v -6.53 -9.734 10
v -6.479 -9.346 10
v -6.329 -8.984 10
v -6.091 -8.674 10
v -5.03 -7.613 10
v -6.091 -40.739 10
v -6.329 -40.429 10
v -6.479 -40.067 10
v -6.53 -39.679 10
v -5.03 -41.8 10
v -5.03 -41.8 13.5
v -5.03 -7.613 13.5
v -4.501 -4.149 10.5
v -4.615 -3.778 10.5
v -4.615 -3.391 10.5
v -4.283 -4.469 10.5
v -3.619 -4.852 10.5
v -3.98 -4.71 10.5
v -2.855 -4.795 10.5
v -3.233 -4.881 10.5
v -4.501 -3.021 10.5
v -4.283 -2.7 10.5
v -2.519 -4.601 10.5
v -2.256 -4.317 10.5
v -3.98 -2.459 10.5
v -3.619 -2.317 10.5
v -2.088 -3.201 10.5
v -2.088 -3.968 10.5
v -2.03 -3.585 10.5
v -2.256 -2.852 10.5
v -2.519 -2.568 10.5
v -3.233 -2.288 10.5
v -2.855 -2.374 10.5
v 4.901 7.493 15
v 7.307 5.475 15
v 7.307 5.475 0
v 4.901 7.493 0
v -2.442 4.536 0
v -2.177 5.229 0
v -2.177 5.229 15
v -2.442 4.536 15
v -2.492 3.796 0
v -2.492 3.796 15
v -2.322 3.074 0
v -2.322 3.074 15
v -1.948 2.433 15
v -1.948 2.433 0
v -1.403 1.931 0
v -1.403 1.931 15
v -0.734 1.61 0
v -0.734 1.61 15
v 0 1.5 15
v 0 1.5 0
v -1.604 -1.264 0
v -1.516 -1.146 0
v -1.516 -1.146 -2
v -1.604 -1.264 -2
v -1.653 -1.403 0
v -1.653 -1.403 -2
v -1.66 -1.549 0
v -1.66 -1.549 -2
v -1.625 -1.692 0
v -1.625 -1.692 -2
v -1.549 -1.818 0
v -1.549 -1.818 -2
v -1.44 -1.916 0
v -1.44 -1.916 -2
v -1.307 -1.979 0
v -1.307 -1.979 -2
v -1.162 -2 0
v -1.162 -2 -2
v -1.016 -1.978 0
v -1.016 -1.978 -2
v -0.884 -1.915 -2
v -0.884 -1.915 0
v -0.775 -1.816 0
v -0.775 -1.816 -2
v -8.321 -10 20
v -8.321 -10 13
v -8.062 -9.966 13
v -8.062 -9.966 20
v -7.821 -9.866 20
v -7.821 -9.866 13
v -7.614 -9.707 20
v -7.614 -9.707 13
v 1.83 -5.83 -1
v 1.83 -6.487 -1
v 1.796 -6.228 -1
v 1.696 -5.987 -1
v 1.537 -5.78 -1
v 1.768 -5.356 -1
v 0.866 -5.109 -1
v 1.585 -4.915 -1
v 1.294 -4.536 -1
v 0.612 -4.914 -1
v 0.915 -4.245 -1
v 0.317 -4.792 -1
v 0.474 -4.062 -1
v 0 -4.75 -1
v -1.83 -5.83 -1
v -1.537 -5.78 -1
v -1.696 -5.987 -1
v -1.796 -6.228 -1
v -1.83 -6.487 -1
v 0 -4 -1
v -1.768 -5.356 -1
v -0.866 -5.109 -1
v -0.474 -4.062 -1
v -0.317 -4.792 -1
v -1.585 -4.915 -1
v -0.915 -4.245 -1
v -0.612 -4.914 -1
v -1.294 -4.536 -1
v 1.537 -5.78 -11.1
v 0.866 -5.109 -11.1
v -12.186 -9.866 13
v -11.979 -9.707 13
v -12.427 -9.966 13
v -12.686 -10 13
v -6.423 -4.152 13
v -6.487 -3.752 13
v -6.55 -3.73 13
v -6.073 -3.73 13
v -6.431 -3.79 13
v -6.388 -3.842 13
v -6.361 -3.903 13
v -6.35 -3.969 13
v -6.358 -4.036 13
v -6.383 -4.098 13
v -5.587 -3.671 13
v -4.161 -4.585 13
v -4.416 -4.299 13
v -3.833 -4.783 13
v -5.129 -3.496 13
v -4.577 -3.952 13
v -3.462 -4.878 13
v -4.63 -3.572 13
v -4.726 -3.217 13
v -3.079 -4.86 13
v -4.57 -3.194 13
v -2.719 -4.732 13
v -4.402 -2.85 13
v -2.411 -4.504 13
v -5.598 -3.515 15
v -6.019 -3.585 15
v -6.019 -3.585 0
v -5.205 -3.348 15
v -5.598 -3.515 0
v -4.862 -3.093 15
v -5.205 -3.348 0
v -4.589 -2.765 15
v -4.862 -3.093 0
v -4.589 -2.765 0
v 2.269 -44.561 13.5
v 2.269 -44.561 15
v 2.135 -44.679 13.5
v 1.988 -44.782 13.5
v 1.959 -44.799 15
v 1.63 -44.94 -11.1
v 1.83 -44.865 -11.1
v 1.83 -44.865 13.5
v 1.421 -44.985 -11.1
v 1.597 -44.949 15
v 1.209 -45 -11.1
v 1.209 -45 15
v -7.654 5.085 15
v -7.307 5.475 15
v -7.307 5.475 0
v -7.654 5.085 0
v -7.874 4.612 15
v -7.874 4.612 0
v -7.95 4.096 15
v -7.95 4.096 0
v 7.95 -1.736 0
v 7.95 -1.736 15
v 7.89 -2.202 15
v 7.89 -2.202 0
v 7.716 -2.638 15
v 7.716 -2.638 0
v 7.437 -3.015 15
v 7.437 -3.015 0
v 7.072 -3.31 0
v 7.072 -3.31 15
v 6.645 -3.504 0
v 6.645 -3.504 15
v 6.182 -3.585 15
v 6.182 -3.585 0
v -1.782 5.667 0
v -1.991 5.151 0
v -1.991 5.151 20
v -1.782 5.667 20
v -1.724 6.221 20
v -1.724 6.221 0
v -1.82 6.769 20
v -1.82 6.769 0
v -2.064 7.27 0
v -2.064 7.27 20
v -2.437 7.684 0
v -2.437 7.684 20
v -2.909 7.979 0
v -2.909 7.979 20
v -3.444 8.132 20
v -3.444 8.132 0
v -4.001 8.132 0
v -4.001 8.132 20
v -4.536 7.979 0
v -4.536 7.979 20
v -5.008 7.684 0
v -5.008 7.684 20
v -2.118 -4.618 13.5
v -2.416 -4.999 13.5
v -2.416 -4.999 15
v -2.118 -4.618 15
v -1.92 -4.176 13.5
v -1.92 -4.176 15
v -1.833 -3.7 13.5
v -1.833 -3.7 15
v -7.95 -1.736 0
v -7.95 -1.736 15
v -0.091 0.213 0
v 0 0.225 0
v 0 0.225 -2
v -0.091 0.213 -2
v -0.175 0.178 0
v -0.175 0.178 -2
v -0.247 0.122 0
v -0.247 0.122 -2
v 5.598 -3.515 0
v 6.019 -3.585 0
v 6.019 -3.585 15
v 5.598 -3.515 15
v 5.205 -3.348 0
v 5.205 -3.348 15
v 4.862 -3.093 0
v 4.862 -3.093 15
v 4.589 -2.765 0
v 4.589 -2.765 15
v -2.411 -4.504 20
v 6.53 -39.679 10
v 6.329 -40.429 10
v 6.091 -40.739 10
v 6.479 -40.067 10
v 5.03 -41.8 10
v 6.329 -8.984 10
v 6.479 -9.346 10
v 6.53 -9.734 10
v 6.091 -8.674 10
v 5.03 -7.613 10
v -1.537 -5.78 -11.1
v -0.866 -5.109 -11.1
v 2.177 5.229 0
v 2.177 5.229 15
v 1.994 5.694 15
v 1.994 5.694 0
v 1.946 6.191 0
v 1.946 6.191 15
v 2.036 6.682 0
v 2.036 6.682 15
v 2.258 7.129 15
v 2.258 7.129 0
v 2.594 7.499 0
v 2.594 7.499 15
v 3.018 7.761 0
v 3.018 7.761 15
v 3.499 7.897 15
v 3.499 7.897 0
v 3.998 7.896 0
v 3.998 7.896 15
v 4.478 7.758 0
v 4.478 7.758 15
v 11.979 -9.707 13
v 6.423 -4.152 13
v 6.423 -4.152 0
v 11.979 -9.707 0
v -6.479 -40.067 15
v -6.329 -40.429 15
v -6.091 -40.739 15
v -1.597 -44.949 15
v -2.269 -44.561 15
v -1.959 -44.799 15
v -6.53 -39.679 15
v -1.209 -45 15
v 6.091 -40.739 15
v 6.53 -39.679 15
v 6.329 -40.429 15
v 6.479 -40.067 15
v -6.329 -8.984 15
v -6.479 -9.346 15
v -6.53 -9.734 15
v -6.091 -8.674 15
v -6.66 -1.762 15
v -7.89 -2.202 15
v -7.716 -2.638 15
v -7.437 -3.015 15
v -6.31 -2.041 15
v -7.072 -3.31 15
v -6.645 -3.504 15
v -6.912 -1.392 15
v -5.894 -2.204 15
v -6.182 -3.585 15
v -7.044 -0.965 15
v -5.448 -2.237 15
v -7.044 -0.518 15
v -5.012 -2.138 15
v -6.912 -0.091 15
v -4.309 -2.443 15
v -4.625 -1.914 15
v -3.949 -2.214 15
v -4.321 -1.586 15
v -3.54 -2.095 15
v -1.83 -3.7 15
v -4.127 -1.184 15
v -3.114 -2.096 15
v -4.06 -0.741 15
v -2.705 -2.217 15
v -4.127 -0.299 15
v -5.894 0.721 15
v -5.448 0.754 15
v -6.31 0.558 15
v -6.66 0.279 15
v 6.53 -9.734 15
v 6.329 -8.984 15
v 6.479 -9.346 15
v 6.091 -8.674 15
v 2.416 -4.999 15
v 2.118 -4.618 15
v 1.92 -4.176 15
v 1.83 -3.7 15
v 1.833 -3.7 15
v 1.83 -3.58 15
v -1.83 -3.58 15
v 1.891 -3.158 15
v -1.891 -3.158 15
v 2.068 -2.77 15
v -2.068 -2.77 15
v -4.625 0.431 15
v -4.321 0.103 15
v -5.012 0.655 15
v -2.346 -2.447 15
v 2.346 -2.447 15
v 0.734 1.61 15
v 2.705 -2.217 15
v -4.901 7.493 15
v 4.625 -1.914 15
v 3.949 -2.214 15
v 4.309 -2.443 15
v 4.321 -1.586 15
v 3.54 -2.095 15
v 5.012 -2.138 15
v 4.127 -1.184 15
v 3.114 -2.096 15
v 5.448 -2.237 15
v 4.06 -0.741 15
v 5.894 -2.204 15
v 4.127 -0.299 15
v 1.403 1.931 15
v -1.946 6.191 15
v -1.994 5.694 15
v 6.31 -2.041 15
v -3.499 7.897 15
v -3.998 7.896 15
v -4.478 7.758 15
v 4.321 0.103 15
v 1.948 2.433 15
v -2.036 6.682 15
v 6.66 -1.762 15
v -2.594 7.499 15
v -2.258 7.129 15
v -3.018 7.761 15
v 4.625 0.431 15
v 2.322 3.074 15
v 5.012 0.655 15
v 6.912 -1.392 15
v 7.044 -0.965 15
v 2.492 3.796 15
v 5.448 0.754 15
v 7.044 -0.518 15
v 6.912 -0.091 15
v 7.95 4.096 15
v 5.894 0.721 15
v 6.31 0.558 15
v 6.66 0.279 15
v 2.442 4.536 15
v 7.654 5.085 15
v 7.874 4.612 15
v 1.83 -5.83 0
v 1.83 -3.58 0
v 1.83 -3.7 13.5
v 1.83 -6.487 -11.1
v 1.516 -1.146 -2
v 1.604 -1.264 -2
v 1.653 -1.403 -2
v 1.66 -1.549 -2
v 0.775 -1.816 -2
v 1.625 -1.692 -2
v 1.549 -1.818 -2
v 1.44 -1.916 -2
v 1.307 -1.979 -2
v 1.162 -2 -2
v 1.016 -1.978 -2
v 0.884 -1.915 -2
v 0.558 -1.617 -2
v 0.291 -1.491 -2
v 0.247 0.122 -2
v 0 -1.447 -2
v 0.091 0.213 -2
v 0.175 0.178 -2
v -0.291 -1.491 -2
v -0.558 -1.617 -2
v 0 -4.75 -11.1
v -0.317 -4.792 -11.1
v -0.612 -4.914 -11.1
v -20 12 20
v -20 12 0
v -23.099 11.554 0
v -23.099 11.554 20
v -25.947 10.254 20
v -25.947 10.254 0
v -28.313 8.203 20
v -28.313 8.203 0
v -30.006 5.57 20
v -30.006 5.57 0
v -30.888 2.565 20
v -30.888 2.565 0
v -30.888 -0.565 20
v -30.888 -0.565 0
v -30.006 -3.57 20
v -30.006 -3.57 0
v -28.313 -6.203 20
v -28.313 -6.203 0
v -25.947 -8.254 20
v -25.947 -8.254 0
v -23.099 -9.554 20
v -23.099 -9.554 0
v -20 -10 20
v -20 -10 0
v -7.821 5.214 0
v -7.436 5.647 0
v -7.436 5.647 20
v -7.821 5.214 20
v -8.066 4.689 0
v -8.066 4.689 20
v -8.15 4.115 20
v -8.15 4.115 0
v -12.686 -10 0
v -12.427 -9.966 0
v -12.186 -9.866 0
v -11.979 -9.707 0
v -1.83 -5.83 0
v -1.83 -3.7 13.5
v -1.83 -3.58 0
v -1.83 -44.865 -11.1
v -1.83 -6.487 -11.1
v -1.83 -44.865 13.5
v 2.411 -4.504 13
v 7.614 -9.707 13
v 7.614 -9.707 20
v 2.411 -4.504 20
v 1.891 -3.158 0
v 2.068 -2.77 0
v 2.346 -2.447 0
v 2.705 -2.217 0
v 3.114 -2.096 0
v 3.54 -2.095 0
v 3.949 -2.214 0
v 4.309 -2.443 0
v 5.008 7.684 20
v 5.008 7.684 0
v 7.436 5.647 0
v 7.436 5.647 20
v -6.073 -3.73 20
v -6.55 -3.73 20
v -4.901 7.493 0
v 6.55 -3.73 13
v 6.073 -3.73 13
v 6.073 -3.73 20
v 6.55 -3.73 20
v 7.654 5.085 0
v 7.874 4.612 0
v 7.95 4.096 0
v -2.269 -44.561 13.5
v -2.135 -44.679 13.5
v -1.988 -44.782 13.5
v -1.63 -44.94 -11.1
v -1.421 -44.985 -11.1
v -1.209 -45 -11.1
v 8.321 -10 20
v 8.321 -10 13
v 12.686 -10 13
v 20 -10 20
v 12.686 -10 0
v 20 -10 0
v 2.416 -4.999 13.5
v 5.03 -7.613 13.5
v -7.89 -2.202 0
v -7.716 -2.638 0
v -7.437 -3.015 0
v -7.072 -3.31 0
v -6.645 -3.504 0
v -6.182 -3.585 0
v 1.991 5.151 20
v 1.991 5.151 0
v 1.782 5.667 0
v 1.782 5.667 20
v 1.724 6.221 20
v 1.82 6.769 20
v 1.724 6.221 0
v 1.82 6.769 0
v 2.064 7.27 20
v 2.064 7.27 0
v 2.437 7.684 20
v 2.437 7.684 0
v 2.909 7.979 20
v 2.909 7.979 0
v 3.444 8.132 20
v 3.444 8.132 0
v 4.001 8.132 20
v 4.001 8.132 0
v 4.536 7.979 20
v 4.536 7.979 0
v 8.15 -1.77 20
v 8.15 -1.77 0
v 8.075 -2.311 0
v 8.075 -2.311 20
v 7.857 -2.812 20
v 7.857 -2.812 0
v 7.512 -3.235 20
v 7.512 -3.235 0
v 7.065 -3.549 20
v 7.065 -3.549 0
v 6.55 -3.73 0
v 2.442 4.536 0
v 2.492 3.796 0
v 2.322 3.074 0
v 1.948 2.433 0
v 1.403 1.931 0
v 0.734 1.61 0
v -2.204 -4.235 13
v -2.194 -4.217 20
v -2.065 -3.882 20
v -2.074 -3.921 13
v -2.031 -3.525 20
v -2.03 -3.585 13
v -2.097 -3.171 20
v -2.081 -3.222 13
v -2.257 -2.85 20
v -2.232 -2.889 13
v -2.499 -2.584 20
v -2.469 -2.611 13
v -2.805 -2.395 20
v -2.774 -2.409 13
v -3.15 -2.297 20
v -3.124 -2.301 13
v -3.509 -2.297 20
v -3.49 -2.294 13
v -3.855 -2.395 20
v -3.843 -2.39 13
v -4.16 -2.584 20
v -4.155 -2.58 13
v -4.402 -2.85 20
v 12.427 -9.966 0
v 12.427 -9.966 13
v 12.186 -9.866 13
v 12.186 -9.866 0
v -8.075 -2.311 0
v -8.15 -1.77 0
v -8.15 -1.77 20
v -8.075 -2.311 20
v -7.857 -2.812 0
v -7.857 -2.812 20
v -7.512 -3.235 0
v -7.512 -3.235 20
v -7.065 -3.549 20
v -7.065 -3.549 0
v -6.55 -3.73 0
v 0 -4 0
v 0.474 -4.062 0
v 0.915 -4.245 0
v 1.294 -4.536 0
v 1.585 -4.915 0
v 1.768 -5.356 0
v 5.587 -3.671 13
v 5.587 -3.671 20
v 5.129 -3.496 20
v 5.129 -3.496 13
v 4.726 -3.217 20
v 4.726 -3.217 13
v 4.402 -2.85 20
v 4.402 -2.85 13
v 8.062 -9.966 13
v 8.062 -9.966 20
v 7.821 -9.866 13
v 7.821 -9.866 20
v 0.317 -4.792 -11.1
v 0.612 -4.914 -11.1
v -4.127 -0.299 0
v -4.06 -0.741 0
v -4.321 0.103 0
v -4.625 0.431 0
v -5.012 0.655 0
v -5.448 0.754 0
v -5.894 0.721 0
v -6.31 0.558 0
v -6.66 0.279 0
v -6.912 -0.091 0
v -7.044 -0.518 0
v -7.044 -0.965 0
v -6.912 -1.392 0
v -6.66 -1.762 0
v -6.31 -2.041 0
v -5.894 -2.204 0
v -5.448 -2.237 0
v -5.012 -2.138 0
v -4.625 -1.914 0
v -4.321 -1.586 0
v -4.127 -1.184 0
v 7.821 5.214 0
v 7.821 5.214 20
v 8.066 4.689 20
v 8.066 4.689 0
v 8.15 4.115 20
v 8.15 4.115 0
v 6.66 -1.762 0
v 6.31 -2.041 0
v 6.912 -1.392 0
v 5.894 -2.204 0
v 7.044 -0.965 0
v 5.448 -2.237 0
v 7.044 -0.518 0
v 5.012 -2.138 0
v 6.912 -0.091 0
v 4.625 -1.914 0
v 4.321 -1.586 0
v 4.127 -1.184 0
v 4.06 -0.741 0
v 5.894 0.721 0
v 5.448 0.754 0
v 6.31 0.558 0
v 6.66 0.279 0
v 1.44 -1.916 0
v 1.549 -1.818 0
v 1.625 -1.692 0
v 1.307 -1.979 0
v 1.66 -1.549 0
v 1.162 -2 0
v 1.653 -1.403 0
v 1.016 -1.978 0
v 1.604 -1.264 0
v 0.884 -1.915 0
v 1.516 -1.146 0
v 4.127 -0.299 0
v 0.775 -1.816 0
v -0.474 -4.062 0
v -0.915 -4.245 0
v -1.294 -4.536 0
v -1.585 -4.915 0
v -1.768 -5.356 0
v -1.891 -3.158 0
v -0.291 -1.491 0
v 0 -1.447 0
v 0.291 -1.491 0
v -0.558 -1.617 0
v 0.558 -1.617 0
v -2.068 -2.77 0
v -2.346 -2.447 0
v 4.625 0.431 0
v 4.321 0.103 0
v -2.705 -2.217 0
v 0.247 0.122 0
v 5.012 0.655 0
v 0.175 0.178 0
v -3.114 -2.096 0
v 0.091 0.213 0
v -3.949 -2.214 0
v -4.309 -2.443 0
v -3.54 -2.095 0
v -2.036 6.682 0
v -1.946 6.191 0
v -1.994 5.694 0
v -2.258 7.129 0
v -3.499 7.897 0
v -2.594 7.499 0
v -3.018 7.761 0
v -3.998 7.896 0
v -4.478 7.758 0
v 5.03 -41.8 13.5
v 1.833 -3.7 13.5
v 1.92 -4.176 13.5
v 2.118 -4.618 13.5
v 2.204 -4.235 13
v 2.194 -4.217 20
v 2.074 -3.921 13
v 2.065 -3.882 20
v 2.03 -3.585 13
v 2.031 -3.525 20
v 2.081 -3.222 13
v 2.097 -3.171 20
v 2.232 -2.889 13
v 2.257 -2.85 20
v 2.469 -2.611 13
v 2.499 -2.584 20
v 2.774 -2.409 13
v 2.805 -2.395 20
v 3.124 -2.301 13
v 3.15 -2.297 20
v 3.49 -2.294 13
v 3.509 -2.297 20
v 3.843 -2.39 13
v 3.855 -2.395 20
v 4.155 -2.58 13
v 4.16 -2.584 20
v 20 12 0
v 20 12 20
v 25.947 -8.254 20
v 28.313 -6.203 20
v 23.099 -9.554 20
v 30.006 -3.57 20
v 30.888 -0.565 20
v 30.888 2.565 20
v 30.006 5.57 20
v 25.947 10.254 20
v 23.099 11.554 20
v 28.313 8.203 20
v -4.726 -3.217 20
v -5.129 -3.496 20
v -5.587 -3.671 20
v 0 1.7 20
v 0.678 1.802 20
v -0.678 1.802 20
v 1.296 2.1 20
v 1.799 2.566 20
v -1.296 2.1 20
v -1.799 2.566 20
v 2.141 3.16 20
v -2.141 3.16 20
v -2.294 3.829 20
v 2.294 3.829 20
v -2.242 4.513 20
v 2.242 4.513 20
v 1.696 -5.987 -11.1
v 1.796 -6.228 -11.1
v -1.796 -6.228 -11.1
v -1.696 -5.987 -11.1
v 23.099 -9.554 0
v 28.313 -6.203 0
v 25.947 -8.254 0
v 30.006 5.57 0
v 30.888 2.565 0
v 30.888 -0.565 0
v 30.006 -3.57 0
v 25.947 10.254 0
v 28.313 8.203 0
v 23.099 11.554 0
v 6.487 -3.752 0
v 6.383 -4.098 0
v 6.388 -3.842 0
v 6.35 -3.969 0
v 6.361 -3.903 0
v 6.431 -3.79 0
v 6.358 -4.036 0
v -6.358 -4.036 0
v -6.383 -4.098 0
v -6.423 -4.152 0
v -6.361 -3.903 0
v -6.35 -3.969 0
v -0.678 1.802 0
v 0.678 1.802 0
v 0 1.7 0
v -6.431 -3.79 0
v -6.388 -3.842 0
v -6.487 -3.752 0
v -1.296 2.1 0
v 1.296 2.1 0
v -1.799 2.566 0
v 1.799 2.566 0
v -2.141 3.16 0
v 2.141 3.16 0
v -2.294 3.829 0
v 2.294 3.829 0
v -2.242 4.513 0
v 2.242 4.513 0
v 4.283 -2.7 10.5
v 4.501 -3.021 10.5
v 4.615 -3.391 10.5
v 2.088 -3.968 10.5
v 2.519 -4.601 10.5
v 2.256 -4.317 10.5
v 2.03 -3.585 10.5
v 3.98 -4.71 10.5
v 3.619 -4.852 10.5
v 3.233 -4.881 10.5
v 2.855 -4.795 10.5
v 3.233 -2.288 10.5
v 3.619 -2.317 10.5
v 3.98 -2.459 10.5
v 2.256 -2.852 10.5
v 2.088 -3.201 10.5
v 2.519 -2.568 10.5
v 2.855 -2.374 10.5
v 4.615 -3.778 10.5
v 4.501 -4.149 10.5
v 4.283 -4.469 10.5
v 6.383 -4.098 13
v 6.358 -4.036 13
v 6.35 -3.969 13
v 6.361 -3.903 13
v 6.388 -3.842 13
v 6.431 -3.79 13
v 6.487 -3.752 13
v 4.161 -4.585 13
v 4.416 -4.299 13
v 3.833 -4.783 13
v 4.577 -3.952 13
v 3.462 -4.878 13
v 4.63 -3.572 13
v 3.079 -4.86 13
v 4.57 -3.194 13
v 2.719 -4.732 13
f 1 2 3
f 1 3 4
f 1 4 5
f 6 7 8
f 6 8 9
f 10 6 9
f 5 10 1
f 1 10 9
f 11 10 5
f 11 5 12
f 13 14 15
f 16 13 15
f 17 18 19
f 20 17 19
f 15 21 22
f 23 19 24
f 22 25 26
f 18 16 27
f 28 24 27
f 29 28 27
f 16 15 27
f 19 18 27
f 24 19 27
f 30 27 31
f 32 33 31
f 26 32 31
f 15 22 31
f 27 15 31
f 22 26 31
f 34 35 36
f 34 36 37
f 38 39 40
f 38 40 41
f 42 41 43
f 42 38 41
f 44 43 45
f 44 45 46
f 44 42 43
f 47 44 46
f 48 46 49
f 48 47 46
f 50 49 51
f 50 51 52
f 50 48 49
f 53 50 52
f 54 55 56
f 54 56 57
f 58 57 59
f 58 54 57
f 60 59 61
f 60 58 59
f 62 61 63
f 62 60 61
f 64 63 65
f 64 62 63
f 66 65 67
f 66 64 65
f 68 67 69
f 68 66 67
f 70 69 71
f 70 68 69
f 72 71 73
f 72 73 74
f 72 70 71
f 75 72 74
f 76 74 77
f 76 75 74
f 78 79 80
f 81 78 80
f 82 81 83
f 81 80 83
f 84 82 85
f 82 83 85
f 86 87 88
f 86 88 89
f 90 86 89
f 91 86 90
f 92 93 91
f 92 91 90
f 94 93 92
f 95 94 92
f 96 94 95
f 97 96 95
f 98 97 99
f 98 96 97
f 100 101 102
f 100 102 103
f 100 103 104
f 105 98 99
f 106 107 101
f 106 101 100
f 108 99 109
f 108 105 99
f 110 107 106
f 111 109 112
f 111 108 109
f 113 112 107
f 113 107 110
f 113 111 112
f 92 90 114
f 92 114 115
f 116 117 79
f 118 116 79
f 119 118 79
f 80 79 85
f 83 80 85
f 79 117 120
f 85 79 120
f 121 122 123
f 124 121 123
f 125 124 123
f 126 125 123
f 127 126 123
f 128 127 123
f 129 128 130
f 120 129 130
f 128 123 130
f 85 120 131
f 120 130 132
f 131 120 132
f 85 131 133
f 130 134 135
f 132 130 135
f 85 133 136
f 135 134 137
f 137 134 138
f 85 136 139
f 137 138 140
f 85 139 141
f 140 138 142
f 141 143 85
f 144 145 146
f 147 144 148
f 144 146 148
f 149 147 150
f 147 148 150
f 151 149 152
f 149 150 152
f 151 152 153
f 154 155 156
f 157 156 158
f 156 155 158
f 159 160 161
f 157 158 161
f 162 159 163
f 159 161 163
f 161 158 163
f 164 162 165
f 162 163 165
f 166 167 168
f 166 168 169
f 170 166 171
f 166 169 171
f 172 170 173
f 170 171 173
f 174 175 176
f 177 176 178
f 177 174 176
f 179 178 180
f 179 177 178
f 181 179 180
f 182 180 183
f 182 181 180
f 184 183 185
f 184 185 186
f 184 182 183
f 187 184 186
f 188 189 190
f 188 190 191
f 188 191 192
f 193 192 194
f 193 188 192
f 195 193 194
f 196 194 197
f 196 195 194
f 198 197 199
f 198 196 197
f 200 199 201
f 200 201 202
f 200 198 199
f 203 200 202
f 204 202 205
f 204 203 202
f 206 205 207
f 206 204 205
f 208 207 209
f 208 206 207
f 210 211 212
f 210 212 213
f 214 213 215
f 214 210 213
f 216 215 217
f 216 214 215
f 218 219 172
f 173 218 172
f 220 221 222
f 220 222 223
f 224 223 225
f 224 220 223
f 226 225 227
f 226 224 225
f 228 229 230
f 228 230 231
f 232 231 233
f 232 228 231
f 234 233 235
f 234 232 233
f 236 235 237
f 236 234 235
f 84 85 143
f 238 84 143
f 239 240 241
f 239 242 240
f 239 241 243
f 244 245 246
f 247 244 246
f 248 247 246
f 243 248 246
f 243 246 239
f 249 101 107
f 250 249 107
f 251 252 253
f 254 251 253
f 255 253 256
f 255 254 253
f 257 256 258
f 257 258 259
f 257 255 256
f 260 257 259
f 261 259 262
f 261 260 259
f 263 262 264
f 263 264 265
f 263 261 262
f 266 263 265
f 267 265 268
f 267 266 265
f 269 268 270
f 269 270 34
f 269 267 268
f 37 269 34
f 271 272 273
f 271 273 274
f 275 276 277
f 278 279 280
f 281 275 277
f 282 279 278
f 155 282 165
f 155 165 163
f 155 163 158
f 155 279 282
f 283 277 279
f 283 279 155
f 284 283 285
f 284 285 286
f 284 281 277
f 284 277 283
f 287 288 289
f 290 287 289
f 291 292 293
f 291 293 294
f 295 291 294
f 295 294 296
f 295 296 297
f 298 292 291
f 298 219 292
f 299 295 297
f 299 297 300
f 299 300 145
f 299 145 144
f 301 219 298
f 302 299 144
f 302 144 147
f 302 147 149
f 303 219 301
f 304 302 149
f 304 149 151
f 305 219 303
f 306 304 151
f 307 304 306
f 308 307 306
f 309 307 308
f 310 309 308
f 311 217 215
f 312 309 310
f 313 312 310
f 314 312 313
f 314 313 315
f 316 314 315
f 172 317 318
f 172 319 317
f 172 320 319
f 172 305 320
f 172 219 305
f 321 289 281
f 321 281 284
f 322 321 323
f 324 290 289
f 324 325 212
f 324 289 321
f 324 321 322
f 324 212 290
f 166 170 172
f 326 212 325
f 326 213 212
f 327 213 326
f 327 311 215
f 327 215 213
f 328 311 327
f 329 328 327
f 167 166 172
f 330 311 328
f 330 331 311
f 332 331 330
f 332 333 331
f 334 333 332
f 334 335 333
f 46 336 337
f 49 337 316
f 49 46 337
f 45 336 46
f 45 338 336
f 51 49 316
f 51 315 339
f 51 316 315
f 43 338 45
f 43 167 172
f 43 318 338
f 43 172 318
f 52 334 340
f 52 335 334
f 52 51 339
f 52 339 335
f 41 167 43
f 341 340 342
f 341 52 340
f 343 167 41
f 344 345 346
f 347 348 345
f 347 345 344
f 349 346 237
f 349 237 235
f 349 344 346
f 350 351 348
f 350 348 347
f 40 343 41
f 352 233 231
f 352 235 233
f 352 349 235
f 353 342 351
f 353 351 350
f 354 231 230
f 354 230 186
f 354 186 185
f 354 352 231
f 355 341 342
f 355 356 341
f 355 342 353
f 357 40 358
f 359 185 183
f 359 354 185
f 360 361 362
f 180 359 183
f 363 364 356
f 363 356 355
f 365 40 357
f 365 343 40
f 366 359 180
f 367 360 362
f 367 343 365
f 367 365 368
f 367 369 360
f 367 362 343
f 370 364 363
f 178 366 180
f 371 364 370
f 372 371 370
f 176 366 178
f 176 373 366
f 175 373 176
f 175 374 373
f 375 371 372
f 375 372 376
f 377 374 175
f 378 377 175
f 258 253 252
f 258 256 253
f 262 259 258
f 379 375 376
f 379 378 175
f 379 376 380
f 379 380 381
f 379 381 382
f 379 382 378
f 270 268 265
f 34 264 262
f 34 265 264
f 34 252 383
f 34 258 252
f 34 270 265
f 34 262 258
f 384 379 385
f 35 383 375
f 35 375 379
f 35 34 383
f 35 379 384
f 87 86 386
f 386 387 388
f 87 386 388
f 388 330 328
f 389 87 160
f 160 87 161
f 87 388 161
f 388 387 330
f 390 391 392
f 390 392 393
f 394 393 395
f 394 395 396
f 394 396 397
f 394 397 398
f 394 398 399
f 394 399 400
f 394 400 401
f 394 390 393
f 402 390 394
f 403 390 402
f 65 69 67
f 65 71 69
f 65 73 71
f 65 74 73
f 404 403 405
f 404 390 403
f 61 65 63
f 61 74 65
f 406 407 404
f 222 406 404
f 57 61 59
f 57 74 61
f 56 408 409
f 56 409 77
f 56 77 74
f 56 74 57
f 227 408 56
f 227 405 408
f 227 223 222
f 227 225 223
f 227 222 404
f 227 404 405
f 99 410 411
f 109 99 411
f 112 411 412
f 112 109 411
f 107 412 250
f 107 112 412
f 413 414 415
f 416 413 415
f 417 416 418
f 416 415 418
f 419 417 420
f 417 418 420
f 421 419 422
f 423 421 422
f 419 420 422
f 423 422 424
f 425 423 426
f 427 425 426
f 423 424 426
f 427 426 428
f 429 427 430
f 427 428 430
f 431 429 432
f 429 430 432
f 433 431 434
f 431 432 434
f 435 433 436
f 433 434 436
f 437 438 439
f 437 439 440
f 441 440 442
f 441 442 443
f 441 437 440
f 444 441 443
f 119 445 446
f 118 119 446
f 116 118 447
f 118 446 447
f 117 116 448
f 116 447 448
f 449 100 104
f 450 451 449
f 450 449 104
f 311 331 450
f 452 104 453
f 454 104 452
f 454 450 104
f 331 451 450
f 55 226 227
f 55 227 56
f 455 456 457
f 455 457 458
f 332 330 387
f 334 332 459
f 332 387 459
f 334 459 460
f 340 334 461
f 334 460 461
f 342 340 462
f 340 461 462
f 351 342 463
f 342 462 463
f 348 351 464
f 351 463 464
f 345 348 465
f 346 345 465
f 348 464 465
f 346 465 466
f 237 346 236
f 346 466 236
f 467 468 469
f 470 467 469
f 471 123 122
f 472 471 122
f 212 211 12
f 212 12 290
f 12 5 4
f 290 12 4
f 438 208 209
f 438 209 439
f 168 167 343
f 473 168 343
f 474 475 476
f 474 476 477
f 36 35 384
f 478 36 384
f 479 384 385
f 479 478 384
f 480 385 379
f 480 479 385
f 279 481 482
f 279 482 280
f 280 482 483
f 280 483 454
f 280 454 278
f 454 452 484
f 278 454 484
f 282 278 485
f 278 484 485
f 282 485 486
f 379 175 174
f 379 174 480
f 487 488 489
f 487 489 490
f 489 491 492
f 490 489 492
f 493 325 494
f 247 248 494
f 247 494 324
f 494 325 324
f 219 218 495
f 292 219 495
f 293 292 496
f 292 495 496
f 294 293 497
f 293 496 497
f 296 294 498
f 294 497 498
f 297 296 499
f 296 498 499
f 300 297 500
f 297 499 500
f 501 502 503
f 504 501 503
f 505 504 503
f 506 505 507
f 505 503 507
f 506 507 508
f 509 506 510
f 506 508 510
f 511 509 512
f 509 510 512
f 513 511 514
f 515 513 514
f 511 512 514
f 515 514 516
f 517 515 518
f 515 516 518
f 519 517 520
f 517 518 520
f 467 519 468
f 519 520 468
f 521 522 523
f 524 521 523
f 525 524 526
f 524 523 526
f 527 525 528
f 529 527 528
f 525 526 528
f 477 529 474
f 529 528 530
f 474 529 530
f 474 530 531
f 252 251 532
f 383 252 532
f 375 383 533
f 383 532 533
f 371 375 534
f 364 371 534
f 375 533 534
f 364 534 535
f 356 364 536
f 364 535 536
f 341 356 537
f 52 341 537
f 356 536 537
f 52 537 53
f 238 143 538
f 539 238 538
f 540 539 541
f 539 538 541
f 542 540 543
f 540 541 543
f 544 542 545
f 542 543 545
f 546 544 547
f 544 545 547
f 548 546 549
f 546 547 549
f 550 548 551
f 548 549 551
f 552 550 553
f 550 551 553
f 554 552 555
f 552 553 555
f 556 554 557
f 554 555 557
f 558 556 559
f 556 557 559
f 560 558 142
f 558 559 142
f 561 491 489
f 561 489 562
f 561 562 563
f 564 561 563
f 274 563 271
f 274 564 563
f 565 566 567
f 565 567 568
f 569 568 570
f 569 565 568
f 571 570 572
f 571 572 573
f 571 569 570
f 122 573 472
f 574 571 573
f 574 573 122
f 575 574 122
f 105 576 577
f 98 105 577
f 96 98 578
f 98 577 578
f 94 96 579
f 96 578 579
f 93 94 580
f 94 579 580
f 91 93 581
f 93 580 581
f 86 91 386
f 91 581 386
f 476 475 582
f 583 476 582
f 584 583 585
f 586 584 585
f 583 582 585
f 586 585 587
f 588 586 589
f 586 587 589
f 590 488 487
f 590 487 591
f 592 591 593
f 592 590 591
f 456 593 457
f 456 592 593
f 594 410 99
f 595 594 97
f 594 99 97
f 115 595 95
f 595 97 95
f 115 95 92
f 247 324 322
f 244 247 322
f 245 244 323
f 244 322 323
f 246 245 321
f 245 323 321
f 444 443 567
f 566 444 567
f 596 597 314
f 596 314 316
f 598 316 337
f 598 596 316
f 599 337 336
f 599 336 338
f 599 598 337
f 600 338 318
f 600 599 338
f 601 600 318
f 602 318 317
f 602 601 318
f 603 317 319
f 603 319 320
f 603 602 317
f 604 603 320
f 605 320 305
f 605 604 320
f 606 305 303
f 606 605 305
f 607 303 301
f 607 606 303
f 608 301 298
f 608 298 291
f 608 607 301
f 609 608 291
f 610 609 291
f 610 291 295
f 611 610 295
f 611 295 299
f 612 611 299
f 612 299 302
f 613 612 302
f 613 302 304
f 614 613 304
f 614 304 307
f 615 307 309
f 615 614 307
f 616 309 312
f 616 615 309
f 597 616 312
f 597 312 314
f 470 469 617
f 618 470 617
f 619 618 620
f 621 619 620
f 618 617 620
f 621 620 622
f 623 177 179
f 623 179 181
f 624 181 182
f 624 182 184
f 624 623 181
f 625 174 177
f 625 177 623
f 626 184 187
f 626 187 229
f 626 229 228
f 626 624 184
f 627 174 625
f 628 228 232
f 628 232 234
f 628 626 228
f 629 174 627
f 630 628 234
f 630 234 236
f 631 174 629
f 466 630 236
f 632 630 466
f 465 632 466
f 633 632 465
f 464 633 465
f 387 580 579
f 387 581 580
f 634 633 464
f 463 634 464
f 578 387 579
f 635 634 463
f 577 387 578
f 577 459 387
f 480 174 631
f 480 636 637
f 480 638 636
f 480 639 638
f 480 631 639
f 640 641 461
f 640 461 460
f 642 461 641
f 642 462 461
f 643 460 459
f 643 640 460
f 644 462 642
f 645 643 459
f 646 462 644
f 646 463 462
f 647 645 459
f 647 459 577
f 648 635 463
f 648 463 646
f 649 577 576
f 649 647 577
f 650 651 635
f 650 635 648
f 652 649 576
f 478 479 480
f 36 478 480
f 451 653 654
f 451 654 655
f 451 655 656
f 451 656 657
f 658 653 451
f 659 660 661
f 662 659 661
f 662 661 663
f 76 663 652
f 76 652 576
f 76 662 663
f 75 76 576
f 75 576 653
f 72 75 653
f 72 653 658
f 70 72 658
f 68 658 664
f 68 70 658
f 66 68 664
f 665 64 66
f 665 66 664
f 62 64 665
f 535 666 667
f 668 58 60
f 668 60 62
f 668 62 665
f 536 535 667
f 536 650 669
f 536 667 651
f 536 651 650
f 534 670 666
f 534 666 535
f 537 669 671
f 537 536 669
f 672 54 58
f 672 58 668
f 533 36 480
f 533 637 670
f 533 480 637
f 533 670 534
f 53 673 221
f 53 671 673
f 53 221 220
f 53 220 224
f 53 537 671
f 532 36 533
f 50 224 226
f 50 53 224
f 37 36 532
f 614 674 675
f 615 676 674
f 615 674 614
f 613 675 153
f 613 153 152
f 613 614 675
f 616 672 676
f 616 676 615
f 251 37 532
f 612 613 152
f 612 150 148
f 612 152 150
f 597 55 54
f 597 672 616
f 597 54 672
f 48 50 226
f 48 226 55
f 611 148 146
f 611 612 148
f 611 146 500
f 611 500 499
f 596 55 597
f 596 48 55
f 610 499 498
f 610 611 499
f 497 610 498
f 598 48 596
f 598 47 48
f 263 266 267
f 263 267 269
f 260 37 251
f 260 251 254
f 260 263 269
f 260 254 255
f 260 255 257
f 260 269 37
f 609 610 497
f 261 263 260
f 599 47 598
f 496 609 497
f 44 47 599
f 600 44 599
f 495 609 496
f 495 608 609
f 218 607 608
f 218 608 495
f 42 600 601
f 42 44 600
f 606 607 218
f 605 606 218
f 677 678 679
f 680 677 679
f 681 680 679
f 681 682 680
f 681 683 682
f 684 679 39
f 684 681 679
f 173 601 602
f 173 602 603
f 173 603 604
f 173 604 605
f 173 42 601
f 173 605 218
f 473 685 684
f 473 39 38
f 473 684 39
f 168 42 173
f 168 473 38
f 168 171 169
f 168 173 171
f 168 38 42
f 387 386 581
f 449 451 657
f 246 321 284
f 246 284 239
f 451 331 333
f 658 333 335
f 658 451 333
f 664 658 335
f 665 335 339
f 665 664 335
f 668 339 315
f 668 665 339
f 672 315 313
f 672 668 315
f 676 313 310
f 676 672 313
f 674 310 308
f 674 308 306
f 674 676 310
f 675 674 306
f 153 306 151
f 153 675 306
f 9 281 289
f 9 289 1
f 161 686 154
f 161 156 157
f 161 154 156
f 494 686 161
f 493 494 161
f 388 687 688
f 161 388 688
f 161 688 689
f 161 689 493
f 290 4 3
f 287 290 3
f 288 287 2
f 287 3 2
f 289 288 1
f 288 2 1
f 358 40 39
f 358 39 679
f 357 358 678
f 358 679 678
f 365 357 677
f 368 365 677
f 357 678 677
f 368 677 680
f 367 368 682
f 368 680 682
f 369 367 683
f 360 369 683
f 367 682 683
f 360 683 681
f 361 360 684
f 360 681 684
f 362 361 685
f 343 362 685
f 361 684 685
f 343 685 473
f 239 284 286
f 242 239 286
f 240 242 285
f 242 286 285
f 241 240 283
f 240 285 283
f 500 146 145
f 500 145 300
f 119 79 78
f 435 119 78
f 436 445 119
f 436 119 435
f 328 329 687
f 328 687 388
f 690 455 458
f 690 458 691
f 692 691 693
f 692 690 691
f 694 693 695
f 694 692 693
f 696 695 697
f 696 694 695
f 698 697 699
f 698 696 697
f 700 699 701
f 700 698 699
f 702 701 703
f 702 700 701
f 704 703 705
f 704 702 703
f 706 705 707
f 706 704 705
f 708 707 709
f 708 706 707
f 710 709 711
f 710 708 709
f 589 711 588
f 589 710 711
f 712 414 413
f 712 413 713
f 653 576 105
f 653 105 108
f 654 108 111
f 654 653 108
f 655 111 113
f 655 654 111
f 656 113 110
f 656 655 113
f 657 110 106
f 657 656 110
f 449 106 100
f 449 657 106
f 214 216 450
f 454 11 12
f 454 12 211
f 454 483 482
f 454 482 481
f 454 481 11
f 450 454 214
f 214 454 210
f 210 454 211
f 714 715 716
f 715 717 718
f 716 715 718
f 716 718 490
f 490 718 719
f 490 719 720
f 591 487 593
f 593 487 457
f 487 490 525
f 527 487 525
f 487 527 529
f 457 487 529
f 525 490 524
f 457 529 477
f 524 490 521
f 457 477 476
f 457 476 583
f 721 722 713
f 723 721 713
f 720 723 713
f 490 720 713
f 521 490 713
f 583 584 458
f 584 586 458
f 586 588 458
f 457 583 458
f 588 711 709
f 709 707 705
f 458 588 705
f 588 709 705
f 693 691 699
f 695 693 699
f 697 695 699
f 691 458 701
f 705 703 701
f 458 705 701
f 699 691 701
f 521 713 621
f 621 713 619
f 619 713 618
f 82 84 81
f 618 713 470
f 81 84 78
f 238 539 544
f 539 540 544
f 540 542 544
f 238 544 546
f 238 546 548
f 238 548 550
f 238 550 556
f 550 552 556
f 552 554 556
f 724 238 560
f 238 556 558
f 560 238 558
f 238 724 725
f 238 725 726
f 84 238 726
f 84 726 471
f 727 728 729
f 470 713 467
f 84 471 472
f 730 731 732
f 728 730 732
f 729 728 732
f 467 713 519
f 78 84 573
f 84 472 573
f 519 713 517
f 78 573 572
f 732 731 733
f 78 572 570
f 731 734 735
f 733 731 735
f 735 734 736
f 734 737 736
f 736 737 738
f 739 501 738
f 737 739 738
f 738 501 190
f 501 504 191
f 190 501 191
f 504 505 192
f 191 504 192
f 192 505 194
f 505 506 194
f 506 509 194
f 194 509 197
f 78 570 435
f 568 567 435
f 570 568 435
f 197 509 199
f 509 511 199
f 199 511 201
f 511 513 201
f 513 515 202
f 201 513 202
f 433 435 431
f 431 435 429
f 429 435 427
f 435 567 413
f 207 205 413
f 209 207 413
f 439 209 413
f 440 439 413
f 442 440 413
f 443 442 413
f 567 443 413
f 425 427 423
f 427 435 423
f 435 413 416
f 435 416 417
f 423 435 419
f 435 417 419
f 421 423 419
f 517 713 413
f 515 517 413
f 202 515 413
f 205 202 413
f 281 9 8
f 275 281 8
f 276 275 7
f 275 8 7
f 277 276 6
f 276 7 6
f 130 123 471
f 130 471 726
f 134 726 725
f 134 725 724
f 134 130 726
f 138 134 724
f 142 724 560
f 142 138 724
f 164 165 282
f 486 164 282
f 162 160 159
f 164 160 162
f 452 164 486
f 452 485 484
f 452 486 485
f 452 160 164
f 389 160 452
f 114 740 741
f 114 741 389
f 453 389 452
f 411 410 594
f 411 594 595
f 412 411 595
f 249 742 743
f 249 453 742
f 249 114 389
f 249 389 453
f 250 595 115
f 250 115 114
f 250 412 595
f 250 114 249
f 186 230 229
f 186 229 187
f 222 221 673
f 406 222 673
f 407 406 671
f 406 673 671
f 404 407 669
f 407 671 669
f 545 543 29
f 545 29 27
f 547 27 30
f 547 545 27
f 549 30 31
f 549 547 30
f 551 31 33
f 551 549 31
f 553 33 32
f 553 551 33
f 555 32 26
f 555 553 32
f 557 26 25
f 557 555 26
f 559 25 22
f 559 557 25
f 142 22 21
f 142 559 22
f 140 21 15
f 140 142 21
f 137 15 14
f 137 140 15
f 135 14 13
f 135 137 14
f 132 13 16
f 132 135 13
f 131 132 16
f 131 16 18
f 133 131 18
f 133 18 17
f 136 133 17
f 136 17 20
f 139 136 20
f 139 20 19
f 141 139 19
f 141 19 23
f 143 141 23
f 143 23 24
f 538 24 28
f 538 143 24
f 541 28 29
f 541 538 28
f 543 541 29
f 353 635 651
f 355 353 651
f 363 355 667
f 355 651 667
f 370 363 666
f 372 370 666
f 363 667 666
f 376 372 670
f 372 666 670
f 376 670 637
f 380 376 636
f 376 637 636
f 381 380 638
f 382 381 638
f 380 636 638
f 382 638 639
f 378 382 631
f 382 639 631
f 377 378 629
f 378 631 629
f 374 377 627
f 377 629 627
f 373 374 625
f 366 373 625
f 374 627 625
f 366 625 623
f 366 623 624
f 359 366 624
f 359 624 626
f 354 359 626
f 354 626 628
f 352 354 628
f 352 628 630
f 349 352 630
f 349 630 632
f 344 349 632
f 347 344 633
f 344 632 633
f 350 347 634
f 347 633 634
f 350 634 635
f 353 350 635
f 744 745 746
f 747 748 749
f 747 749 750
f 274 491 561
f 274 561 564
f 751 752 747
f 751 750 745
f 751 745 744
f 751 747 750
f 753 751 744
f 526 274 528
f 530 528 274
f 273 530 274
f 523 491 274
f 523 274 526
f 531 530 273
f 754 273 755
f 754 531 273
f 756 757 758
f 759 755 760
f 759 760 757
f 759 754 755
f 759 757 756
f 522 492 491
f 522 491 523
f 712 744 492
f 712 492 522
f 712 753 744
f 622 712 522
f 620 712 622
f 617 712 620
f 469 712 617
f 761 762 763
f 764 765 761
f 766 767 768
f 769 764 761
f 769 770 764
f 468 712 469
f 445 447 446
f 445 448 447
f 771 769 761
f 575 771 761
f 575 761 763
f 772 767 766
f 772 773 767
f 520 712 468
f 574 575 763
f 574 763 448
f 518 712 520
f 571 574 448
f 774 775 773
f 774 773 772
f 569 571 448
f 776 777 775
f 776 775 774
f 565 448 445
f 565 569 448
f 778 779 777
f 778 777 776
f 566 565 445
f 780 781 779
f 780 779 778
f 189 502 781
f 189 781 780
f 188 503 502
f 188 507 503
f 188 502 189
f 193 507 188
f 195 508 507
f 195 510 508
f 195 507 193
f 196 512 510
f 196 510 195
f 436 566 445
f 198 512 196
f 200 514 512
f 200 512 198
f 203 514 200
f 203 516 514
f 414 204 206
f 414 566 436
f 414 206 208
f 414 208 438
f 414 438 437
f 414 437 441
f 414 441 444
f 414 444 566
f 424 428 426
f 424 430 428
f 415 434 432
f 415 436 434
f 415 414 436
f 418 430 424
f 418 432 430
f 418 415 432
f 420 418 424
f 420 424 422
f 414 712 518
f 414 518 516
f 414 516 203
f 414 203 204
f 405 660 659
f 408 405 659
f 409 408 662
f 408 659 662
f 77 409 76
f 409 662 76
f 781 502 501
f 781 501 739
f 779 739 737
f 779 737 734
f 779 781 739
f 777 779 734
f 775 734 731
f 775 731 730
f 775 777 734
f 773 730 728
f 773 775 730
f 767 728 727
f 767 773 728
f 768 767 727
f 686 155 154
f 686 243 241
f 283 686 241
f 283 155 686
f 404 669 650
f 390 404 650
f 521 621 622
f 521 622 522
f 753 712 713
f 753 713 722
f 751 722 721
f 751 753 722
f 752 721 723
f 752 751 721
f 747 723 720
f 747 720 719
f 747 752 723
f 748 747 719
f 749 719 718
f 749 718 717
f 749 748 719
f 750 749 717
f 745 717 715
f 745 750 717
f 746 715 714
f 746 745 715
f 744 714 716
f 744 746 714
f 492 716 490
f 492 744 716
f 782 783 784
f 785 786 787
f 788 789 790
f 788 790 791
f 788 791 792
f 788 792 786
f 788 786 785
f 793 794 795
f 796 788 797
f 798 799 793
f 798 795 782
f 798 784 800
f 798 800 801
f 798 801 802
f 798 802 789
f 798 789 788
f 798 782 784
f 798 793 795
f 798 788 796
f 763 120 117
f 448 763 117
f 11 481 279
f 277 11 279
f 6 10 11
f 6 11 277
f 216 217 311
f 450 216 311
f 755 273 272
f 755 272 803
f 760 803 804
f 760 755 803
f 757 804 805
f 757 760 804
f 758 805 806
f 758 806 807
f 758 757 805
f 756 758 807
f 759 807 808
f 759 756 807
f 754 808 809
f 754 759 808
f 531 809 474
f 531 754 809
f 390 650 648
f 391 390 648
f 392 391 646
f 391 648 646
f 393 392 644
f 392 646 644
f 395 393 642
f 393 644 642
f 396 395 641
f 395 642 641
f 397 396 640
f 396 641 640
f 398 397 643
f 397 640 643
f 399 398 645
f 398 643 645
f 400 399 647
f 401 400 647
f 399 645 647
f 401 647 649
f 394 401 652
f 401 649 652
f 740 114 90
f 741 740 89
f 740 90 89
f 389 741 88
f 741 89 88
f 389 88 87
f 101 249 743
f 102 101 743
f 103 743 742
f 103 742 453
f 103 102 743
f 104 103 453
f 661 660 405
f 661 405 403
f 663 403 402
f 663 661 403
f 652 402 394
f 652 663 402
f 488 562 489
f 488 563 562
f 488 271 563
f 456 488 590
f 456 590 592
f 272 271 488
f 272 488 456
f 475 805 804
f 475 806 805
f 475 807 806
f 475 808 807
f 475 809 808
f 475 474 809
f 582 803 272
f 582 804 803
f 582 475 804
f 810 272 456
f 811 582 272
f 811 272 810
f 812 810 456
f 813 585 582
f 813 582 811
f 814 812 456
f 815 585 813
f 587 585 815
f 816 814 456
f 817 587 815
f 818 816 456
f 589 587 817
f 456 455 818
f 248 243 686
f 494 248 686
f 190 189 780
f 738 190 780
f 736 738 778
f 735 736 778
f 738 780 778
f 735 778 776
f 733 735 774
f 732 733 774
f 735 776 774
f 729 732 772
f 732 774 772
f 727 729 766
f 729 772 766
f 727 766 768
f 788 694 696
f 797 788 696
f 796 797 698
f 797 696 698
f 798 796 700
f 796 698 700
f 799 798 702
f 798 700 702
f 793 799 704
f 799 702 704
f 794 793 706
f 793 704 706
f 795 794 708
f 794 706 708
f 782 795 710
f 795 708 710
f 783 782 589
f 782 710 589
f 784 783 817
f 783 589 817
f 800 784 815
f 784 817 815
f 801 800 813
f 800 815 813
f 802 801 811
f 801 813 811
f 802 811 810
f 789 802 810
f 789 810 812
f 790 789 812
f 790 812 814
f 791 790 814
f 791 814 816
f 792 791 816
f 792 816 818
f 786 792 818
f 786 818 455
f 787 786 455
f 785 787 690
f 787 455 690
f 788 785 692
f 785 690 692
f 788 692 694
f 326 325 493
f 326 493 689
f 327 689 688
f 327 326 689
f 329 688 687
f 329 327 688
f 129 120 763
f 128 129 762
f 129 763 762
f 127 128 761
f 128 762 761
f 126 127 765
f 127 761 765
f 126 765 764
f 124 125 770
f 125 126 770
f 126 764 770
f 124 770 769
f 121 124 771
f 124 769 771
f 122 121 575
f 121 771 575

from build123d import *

# Parameters (mm, degrees)
SKETCH_R          = 1.5
PAD_DEPTH         = 15
PAD006_DEPTH      = 2
SKETCH005_W       = 1.83
SKETCH005_H       = 41
PAD005_DEPTH      = 15
PAD007_DEPTH      = 1
PAD008_DEPTH      = 11.1
PAD009_DEPTH      = 22
PAD009_DEPTH_BACK = 19.3
POCKET_DEPTH      = 133.3129393933
POCKET_DEPTH_BACK = 137.2129393933
PAD001_DEPTH      = 20
PAD002_DEPTH      = 7
SKETCH003_R       = 1.3
PAD003_DEPTH      = 2.5


with BuildPart() as body:
    # Sketch → Pad (new body)
    with BuildSketch(Plane.XY):
        with BuildLine():
            ThreePointArc((-1.83, -3.58), (-2.9049331603, -2.1414875107), (-4.5890909091, -2.7647147232))
            ThreePointArc((-6.1, -3.5863723909), (-5.2400628505, -3.3676718879), (-4.5890909091, -2.7647147232))
            ThreePointArc((-7.95, -1.7363723909), (-7.4081475452, -3.0445199361), (-6.1, -3.5863723909))
            Line((-7.95, -1.7363723909), (-7.95, 4.0956547944))
            ThreePointArc((-7.3070176974, 5.474534792), (-7.7813540167, 4.8563676655), (-7.95, 4.0956547944))
            Line((-7.3070176974, 5.474534792), (-4.9013306959, 7.4931458677))
            ThreePointArc((-2.1769261619, 5.2292243431), (-2.5939061683, 7.4986661464), (-4.9013306959, 7.4931458677))
            ThreePointArc((-2.1769261619, 5.2292243431), (-2.1590577641, 2.7396549793), (0, 1.5))
            Line((0, -4), (0, 1.5))
            Line((-1.83, -4), (0, -4))
            Line((-1.83, -3.58), (-1.83, -4))
        make_face()
        with Locations((-5.5604732033, -0.74149876)):
            Circle(SKETCH_R, mode=Mode.SUBTRACT)
    pad = extrude(amount=PAD_DEPTH)

    # Sketch006 → Pad006 (join)
    with BuildSketch(Plane.XY):
        with BuildLine():
            ThreePointArc((0, 0.225), (-0.1339392013, 0.1983578364), (-0.2474873734, 0.1224873734))
            Line((-0.2474873734, 0.1224873734), (-1.5164213562, -1.1464466094))
            ThreePointArc((-1.5164213562, -1.1464466094), (-1.4979929518, -1.8710677076), (-0.7752453104, -1.8158301397))
            ThreePointArc((0, -1.4474904192), (-0.4291501605, -1.5442572601), (-0.7752453104, -1.8158301397))
            Line((0, 0.225), (0, -1.4474904192))
        make_face()
    pad006 = extrude(amount=-PAD006_DEPTH)

    # Mirrored: Pad, Pad006 across Sketch V_Axis
    add(pad.mirror(Plane(origin=(0, 0, 0), x_dir=(0, 0, 1), z_dir=(1, 0, 0))))
    add(pad006.mirror(Plane(origin=(0, 0, 0), x_dir=(0, 0, 1), z_dir=(1, 0, 0))))

    # Sketch005 → Pad005 (join)
    with BuildSketch(Plane.XY):
        with Locations((-0.915, -24.5)):
            Rectangle(SKETCH005_W, SKETCH005_H)
    pad005 = extrude(amount=PAD005_DEPTH)

    # Sketch007 → Pad007 (join)
    with BuildSketch(Plane.XY):
        with BuildLine():
            ThreePointArc((0, -4), (-1.2940054096, -4.5359945904), (-1.83, -5.83))
            Line((-1.83, -5.83), (-1.83, -45))
            Line((-1.83, -45), (0, -45))
            Line((0, -4), (0, -45))
        make_face()
    pad007 = extrude(amount=-PAD007_DEPTH)

    # Sketch008 → Pad008 (join)
    with BuildSketch(Plane.XY):
        with BuildLine():
            ThreePointArc((0, -4.75), (-0.4687872046, -4.8432475727), (-0.866205807, -5.108794193))
            Line((-1.5371067812, -5.7796951673), (-0.866205807, -5.108794193))
            ThreePointArc((-1.5371067812, -5.7796951673), (-1.7538795325, -6.1041185161), (-1.83, -6.4868019485))
            Line((-1.83, -6.4868019485), (-1.83, -45))
            Line((-1.83, -45), (0, -45))
            Line((0, -4.75), (0, -45))
        make_face()
    pad008 = extrude(amount=-PAD008_DEPTH)

    # Mirrored002: Pad005, Pad007, Pad008 across Sketch004 V_Axis
    add(pad005.mirror(Plane(origin=(0, 0, 0), x_dir=(0, 0, 1), z_dir=(1, 0, 0))))
    add(pad007.mirror(Plane(origin=(0, 0, 0), x_dir=(0, 0, 1), z_dir=(1, 0, 0))))
    add(pad008.mirror(Plane(origin=(0, 0, 0), x_dir=(0, 0, 1), z_dir=(1, 0, 0))))

    # Sketch009 (on DatumPlane) → Pad009 (join, two sides)
    with BuildSketch(Plane.XZ.offset(23)) as pad009_sk:
        Polygon((-1.83, 15), (-6.53, 15), (-6.53, 10), (-5.03, 10), (-5.03, 13.5), (-1.83, 13.5), align=None)
    pad009 = extrude(amount=PAD009_DEPTH) + extrude(pad009_sk.sketch, amount=-PAD009_DEPTH_BACK)

    # Sketch010 → Pocket (cut, two sides)
    with BuildSketch(Plane.XY) as pocket_sk:
        with BuildLine():
            Line((-2.4157864376, -4.9987635624), (-6.0906601718, -8.6736372965))
            ThreePointArc((-6.0906601718, -8.6736372965), (-6.4158192988, -9.1602723198), (-6.53, -9.7342974683))
            Line((-6.53, -9.7342974683), (-6.53, -11.58455))
            Line((-6.53, -11.58455), (-7.83, -11.58455))
            Line((-7.83, -11.58455), (-7.83, -3.58455))
            Line((-1.83, -3.58455), (-7.83, -3.58455))
            ThreePointArc((-2.4157864376, -4.9987635624), (-1.982240935, -4.3499168647), (-1.83, -3.58455))
        make_face()
        with BuildLine():
            Line((0, -45), (-1.2086796564, -45))
            ThreePointArc((-2.2693398282, -44.5606601718), (-1.782704805, -44.8858192988), (-1.2086796564, -45))
            Line((-2.2693398282, -44.5606601718), (-6.0906601718, -40.7393398282))
            ThreePointArc((-6.53, -39.6786796564), (-6.4158192988, -40.252704805), (-6.0906601718, -40.7393398282))
            Line((-6.53, -39.6786796564), (-6.53, -38.47))
            Line((-6.53, -38.47), (-7.53, -38.47))
            Line((-7.53, -38.47), (-7.53, -46))
            Line((-7.53, -46), (0, -46))
            Line((0, -46), (0, -45))
        make_face()
    pocket = extrude(amount=-POCKET_DEPTH, mode=Mode.SUBTRACT) + extrude(pocket_sk.sketch, amount=POCKET_DEPTH_BACK, mode=Mode.SUBTRACT)

    # Mirrored003: Pad009, Pocket across Sketch009 V_Axis
    add(pad009.mirror(Plane(origin=(0, -23, 0), x_dir=(0, -1, 0), z_dir=(1, 0, 0))))
    add(pocket.mirror(Plane(origin=(0, -23, 0), x_dir=(0, -1, 0), z_dir=(1, 0, 0))), mode=Mode.SUBTRACT)


with BuildPart() as body001:
    # Sketch001 → Pad001 (new body)
    with BuildSketch(Plane.XY):
        with BuildLine():
            Line((0, 12), (-20, 12))
            ThreePointArc((-20, 12), (-31, 1), (-20, -10))
            Line((-20, -10), (-12.6857111975, -10))
            ThreePointArc((-12.6857111975, -10), (-12.3030277651, -9.9238795325), (-11.9786044163, -9.7071067812))
            Line((-6.4232233047, -4.1517256696), (-11.9786044163, -9.7071067812))
            ThreePointArc((-6.4232233047, -4.1517256696), (-6.3605839344, -3.902977122), (-6.55, -3.73))
            ThreePointArc((-8.15, -1.7704082058), (-7.6991933385, -3.0353192698), (-6.55, -3.73))
            Line((-8.15, 4.1152625783), (-8.15, -1.7704082058))
            ThreePointArc((-7.4355752194, 5.6473514645), (-7.9626155741, 4.9604991017), (-8.15, 4.1152625783))
            Line((-5.0083695026, 7.6840188862), (-7.4355752194, 5.6473514645))
            ThreePointArc((-1.9912620585, 5.1510323256), (-2.4368220278, 7.6836856457), (-5.0083695026, 7.6840188862))
            ThreePointArc((-1.9912620585, 5.1510323256), (-1.9921564131, 2.8505162787), (0, 1.7))
            Line((0, 12), (0, 1.7))
        make_face()
    pad001 = extrude(amount=PAD001_DEPTH)

    # Sketch002 (on DatumPlane) → Pad002 (join)
    with BuildSketch(Plane.XY.offset(13)):
        with BuildLine():
            ThreePointArc((-2.4107611845, -4.5037888155), (-2.4994132109, -2.584487209), (-4.4023704347, -2.8496883459))
            ThreePointArc((-6.0727936119, -3.73), (-5.1286985162, -3.4964545627), (-4.4023704347, -2.8496883459))
            Line((-6.0727936119, -3.73), (-15, -3.73))
            Line((-15, -10), (-15, -3.73))
            Line((-8.3211859313, -10), (-15, -10))
            ThreePointArc((-8.3211859313, -10), (-7.9385024989, -9.9238795325), (-7.6140791501, -9.7071067812))
            Line((-7.6140791501, -9.7071067812), (-2.4107611845, -4.5037888155))
        make_face()
    pad002 = extrude(amount=PAD002_DEPTH)

    # Sketch003 (on DatumPlane) → Pad003 (join)
    with BuildSketch(Plane.XY.offset(13)):
        with Locations((-3.33, -3.58455)):
            Circle(SKETCH003_R)
    pad003 = extrude(amount=-PAD003_DEPTH)

    # Mirrored001: Pad001, Pad002, Pad003 across Sketch001 V_Axis
    add(pad001.mirror(Plane(origin=(0, 0, 0), x_dir=(0, 0, 1), z_dir=(1, 0, 0))))
    add(pad002.mirror(Plane(origin=(0, 0, 0), x_dir=(0, 0, 1), z_dir=(1, 0, 0))))
    add(pad003.mirror(Plane(origin=(0, 0, 0), x_dir=(0, 0, 1), z_dir=(1, 0, 0))))


solid = Compound([body.part, body001.part])
